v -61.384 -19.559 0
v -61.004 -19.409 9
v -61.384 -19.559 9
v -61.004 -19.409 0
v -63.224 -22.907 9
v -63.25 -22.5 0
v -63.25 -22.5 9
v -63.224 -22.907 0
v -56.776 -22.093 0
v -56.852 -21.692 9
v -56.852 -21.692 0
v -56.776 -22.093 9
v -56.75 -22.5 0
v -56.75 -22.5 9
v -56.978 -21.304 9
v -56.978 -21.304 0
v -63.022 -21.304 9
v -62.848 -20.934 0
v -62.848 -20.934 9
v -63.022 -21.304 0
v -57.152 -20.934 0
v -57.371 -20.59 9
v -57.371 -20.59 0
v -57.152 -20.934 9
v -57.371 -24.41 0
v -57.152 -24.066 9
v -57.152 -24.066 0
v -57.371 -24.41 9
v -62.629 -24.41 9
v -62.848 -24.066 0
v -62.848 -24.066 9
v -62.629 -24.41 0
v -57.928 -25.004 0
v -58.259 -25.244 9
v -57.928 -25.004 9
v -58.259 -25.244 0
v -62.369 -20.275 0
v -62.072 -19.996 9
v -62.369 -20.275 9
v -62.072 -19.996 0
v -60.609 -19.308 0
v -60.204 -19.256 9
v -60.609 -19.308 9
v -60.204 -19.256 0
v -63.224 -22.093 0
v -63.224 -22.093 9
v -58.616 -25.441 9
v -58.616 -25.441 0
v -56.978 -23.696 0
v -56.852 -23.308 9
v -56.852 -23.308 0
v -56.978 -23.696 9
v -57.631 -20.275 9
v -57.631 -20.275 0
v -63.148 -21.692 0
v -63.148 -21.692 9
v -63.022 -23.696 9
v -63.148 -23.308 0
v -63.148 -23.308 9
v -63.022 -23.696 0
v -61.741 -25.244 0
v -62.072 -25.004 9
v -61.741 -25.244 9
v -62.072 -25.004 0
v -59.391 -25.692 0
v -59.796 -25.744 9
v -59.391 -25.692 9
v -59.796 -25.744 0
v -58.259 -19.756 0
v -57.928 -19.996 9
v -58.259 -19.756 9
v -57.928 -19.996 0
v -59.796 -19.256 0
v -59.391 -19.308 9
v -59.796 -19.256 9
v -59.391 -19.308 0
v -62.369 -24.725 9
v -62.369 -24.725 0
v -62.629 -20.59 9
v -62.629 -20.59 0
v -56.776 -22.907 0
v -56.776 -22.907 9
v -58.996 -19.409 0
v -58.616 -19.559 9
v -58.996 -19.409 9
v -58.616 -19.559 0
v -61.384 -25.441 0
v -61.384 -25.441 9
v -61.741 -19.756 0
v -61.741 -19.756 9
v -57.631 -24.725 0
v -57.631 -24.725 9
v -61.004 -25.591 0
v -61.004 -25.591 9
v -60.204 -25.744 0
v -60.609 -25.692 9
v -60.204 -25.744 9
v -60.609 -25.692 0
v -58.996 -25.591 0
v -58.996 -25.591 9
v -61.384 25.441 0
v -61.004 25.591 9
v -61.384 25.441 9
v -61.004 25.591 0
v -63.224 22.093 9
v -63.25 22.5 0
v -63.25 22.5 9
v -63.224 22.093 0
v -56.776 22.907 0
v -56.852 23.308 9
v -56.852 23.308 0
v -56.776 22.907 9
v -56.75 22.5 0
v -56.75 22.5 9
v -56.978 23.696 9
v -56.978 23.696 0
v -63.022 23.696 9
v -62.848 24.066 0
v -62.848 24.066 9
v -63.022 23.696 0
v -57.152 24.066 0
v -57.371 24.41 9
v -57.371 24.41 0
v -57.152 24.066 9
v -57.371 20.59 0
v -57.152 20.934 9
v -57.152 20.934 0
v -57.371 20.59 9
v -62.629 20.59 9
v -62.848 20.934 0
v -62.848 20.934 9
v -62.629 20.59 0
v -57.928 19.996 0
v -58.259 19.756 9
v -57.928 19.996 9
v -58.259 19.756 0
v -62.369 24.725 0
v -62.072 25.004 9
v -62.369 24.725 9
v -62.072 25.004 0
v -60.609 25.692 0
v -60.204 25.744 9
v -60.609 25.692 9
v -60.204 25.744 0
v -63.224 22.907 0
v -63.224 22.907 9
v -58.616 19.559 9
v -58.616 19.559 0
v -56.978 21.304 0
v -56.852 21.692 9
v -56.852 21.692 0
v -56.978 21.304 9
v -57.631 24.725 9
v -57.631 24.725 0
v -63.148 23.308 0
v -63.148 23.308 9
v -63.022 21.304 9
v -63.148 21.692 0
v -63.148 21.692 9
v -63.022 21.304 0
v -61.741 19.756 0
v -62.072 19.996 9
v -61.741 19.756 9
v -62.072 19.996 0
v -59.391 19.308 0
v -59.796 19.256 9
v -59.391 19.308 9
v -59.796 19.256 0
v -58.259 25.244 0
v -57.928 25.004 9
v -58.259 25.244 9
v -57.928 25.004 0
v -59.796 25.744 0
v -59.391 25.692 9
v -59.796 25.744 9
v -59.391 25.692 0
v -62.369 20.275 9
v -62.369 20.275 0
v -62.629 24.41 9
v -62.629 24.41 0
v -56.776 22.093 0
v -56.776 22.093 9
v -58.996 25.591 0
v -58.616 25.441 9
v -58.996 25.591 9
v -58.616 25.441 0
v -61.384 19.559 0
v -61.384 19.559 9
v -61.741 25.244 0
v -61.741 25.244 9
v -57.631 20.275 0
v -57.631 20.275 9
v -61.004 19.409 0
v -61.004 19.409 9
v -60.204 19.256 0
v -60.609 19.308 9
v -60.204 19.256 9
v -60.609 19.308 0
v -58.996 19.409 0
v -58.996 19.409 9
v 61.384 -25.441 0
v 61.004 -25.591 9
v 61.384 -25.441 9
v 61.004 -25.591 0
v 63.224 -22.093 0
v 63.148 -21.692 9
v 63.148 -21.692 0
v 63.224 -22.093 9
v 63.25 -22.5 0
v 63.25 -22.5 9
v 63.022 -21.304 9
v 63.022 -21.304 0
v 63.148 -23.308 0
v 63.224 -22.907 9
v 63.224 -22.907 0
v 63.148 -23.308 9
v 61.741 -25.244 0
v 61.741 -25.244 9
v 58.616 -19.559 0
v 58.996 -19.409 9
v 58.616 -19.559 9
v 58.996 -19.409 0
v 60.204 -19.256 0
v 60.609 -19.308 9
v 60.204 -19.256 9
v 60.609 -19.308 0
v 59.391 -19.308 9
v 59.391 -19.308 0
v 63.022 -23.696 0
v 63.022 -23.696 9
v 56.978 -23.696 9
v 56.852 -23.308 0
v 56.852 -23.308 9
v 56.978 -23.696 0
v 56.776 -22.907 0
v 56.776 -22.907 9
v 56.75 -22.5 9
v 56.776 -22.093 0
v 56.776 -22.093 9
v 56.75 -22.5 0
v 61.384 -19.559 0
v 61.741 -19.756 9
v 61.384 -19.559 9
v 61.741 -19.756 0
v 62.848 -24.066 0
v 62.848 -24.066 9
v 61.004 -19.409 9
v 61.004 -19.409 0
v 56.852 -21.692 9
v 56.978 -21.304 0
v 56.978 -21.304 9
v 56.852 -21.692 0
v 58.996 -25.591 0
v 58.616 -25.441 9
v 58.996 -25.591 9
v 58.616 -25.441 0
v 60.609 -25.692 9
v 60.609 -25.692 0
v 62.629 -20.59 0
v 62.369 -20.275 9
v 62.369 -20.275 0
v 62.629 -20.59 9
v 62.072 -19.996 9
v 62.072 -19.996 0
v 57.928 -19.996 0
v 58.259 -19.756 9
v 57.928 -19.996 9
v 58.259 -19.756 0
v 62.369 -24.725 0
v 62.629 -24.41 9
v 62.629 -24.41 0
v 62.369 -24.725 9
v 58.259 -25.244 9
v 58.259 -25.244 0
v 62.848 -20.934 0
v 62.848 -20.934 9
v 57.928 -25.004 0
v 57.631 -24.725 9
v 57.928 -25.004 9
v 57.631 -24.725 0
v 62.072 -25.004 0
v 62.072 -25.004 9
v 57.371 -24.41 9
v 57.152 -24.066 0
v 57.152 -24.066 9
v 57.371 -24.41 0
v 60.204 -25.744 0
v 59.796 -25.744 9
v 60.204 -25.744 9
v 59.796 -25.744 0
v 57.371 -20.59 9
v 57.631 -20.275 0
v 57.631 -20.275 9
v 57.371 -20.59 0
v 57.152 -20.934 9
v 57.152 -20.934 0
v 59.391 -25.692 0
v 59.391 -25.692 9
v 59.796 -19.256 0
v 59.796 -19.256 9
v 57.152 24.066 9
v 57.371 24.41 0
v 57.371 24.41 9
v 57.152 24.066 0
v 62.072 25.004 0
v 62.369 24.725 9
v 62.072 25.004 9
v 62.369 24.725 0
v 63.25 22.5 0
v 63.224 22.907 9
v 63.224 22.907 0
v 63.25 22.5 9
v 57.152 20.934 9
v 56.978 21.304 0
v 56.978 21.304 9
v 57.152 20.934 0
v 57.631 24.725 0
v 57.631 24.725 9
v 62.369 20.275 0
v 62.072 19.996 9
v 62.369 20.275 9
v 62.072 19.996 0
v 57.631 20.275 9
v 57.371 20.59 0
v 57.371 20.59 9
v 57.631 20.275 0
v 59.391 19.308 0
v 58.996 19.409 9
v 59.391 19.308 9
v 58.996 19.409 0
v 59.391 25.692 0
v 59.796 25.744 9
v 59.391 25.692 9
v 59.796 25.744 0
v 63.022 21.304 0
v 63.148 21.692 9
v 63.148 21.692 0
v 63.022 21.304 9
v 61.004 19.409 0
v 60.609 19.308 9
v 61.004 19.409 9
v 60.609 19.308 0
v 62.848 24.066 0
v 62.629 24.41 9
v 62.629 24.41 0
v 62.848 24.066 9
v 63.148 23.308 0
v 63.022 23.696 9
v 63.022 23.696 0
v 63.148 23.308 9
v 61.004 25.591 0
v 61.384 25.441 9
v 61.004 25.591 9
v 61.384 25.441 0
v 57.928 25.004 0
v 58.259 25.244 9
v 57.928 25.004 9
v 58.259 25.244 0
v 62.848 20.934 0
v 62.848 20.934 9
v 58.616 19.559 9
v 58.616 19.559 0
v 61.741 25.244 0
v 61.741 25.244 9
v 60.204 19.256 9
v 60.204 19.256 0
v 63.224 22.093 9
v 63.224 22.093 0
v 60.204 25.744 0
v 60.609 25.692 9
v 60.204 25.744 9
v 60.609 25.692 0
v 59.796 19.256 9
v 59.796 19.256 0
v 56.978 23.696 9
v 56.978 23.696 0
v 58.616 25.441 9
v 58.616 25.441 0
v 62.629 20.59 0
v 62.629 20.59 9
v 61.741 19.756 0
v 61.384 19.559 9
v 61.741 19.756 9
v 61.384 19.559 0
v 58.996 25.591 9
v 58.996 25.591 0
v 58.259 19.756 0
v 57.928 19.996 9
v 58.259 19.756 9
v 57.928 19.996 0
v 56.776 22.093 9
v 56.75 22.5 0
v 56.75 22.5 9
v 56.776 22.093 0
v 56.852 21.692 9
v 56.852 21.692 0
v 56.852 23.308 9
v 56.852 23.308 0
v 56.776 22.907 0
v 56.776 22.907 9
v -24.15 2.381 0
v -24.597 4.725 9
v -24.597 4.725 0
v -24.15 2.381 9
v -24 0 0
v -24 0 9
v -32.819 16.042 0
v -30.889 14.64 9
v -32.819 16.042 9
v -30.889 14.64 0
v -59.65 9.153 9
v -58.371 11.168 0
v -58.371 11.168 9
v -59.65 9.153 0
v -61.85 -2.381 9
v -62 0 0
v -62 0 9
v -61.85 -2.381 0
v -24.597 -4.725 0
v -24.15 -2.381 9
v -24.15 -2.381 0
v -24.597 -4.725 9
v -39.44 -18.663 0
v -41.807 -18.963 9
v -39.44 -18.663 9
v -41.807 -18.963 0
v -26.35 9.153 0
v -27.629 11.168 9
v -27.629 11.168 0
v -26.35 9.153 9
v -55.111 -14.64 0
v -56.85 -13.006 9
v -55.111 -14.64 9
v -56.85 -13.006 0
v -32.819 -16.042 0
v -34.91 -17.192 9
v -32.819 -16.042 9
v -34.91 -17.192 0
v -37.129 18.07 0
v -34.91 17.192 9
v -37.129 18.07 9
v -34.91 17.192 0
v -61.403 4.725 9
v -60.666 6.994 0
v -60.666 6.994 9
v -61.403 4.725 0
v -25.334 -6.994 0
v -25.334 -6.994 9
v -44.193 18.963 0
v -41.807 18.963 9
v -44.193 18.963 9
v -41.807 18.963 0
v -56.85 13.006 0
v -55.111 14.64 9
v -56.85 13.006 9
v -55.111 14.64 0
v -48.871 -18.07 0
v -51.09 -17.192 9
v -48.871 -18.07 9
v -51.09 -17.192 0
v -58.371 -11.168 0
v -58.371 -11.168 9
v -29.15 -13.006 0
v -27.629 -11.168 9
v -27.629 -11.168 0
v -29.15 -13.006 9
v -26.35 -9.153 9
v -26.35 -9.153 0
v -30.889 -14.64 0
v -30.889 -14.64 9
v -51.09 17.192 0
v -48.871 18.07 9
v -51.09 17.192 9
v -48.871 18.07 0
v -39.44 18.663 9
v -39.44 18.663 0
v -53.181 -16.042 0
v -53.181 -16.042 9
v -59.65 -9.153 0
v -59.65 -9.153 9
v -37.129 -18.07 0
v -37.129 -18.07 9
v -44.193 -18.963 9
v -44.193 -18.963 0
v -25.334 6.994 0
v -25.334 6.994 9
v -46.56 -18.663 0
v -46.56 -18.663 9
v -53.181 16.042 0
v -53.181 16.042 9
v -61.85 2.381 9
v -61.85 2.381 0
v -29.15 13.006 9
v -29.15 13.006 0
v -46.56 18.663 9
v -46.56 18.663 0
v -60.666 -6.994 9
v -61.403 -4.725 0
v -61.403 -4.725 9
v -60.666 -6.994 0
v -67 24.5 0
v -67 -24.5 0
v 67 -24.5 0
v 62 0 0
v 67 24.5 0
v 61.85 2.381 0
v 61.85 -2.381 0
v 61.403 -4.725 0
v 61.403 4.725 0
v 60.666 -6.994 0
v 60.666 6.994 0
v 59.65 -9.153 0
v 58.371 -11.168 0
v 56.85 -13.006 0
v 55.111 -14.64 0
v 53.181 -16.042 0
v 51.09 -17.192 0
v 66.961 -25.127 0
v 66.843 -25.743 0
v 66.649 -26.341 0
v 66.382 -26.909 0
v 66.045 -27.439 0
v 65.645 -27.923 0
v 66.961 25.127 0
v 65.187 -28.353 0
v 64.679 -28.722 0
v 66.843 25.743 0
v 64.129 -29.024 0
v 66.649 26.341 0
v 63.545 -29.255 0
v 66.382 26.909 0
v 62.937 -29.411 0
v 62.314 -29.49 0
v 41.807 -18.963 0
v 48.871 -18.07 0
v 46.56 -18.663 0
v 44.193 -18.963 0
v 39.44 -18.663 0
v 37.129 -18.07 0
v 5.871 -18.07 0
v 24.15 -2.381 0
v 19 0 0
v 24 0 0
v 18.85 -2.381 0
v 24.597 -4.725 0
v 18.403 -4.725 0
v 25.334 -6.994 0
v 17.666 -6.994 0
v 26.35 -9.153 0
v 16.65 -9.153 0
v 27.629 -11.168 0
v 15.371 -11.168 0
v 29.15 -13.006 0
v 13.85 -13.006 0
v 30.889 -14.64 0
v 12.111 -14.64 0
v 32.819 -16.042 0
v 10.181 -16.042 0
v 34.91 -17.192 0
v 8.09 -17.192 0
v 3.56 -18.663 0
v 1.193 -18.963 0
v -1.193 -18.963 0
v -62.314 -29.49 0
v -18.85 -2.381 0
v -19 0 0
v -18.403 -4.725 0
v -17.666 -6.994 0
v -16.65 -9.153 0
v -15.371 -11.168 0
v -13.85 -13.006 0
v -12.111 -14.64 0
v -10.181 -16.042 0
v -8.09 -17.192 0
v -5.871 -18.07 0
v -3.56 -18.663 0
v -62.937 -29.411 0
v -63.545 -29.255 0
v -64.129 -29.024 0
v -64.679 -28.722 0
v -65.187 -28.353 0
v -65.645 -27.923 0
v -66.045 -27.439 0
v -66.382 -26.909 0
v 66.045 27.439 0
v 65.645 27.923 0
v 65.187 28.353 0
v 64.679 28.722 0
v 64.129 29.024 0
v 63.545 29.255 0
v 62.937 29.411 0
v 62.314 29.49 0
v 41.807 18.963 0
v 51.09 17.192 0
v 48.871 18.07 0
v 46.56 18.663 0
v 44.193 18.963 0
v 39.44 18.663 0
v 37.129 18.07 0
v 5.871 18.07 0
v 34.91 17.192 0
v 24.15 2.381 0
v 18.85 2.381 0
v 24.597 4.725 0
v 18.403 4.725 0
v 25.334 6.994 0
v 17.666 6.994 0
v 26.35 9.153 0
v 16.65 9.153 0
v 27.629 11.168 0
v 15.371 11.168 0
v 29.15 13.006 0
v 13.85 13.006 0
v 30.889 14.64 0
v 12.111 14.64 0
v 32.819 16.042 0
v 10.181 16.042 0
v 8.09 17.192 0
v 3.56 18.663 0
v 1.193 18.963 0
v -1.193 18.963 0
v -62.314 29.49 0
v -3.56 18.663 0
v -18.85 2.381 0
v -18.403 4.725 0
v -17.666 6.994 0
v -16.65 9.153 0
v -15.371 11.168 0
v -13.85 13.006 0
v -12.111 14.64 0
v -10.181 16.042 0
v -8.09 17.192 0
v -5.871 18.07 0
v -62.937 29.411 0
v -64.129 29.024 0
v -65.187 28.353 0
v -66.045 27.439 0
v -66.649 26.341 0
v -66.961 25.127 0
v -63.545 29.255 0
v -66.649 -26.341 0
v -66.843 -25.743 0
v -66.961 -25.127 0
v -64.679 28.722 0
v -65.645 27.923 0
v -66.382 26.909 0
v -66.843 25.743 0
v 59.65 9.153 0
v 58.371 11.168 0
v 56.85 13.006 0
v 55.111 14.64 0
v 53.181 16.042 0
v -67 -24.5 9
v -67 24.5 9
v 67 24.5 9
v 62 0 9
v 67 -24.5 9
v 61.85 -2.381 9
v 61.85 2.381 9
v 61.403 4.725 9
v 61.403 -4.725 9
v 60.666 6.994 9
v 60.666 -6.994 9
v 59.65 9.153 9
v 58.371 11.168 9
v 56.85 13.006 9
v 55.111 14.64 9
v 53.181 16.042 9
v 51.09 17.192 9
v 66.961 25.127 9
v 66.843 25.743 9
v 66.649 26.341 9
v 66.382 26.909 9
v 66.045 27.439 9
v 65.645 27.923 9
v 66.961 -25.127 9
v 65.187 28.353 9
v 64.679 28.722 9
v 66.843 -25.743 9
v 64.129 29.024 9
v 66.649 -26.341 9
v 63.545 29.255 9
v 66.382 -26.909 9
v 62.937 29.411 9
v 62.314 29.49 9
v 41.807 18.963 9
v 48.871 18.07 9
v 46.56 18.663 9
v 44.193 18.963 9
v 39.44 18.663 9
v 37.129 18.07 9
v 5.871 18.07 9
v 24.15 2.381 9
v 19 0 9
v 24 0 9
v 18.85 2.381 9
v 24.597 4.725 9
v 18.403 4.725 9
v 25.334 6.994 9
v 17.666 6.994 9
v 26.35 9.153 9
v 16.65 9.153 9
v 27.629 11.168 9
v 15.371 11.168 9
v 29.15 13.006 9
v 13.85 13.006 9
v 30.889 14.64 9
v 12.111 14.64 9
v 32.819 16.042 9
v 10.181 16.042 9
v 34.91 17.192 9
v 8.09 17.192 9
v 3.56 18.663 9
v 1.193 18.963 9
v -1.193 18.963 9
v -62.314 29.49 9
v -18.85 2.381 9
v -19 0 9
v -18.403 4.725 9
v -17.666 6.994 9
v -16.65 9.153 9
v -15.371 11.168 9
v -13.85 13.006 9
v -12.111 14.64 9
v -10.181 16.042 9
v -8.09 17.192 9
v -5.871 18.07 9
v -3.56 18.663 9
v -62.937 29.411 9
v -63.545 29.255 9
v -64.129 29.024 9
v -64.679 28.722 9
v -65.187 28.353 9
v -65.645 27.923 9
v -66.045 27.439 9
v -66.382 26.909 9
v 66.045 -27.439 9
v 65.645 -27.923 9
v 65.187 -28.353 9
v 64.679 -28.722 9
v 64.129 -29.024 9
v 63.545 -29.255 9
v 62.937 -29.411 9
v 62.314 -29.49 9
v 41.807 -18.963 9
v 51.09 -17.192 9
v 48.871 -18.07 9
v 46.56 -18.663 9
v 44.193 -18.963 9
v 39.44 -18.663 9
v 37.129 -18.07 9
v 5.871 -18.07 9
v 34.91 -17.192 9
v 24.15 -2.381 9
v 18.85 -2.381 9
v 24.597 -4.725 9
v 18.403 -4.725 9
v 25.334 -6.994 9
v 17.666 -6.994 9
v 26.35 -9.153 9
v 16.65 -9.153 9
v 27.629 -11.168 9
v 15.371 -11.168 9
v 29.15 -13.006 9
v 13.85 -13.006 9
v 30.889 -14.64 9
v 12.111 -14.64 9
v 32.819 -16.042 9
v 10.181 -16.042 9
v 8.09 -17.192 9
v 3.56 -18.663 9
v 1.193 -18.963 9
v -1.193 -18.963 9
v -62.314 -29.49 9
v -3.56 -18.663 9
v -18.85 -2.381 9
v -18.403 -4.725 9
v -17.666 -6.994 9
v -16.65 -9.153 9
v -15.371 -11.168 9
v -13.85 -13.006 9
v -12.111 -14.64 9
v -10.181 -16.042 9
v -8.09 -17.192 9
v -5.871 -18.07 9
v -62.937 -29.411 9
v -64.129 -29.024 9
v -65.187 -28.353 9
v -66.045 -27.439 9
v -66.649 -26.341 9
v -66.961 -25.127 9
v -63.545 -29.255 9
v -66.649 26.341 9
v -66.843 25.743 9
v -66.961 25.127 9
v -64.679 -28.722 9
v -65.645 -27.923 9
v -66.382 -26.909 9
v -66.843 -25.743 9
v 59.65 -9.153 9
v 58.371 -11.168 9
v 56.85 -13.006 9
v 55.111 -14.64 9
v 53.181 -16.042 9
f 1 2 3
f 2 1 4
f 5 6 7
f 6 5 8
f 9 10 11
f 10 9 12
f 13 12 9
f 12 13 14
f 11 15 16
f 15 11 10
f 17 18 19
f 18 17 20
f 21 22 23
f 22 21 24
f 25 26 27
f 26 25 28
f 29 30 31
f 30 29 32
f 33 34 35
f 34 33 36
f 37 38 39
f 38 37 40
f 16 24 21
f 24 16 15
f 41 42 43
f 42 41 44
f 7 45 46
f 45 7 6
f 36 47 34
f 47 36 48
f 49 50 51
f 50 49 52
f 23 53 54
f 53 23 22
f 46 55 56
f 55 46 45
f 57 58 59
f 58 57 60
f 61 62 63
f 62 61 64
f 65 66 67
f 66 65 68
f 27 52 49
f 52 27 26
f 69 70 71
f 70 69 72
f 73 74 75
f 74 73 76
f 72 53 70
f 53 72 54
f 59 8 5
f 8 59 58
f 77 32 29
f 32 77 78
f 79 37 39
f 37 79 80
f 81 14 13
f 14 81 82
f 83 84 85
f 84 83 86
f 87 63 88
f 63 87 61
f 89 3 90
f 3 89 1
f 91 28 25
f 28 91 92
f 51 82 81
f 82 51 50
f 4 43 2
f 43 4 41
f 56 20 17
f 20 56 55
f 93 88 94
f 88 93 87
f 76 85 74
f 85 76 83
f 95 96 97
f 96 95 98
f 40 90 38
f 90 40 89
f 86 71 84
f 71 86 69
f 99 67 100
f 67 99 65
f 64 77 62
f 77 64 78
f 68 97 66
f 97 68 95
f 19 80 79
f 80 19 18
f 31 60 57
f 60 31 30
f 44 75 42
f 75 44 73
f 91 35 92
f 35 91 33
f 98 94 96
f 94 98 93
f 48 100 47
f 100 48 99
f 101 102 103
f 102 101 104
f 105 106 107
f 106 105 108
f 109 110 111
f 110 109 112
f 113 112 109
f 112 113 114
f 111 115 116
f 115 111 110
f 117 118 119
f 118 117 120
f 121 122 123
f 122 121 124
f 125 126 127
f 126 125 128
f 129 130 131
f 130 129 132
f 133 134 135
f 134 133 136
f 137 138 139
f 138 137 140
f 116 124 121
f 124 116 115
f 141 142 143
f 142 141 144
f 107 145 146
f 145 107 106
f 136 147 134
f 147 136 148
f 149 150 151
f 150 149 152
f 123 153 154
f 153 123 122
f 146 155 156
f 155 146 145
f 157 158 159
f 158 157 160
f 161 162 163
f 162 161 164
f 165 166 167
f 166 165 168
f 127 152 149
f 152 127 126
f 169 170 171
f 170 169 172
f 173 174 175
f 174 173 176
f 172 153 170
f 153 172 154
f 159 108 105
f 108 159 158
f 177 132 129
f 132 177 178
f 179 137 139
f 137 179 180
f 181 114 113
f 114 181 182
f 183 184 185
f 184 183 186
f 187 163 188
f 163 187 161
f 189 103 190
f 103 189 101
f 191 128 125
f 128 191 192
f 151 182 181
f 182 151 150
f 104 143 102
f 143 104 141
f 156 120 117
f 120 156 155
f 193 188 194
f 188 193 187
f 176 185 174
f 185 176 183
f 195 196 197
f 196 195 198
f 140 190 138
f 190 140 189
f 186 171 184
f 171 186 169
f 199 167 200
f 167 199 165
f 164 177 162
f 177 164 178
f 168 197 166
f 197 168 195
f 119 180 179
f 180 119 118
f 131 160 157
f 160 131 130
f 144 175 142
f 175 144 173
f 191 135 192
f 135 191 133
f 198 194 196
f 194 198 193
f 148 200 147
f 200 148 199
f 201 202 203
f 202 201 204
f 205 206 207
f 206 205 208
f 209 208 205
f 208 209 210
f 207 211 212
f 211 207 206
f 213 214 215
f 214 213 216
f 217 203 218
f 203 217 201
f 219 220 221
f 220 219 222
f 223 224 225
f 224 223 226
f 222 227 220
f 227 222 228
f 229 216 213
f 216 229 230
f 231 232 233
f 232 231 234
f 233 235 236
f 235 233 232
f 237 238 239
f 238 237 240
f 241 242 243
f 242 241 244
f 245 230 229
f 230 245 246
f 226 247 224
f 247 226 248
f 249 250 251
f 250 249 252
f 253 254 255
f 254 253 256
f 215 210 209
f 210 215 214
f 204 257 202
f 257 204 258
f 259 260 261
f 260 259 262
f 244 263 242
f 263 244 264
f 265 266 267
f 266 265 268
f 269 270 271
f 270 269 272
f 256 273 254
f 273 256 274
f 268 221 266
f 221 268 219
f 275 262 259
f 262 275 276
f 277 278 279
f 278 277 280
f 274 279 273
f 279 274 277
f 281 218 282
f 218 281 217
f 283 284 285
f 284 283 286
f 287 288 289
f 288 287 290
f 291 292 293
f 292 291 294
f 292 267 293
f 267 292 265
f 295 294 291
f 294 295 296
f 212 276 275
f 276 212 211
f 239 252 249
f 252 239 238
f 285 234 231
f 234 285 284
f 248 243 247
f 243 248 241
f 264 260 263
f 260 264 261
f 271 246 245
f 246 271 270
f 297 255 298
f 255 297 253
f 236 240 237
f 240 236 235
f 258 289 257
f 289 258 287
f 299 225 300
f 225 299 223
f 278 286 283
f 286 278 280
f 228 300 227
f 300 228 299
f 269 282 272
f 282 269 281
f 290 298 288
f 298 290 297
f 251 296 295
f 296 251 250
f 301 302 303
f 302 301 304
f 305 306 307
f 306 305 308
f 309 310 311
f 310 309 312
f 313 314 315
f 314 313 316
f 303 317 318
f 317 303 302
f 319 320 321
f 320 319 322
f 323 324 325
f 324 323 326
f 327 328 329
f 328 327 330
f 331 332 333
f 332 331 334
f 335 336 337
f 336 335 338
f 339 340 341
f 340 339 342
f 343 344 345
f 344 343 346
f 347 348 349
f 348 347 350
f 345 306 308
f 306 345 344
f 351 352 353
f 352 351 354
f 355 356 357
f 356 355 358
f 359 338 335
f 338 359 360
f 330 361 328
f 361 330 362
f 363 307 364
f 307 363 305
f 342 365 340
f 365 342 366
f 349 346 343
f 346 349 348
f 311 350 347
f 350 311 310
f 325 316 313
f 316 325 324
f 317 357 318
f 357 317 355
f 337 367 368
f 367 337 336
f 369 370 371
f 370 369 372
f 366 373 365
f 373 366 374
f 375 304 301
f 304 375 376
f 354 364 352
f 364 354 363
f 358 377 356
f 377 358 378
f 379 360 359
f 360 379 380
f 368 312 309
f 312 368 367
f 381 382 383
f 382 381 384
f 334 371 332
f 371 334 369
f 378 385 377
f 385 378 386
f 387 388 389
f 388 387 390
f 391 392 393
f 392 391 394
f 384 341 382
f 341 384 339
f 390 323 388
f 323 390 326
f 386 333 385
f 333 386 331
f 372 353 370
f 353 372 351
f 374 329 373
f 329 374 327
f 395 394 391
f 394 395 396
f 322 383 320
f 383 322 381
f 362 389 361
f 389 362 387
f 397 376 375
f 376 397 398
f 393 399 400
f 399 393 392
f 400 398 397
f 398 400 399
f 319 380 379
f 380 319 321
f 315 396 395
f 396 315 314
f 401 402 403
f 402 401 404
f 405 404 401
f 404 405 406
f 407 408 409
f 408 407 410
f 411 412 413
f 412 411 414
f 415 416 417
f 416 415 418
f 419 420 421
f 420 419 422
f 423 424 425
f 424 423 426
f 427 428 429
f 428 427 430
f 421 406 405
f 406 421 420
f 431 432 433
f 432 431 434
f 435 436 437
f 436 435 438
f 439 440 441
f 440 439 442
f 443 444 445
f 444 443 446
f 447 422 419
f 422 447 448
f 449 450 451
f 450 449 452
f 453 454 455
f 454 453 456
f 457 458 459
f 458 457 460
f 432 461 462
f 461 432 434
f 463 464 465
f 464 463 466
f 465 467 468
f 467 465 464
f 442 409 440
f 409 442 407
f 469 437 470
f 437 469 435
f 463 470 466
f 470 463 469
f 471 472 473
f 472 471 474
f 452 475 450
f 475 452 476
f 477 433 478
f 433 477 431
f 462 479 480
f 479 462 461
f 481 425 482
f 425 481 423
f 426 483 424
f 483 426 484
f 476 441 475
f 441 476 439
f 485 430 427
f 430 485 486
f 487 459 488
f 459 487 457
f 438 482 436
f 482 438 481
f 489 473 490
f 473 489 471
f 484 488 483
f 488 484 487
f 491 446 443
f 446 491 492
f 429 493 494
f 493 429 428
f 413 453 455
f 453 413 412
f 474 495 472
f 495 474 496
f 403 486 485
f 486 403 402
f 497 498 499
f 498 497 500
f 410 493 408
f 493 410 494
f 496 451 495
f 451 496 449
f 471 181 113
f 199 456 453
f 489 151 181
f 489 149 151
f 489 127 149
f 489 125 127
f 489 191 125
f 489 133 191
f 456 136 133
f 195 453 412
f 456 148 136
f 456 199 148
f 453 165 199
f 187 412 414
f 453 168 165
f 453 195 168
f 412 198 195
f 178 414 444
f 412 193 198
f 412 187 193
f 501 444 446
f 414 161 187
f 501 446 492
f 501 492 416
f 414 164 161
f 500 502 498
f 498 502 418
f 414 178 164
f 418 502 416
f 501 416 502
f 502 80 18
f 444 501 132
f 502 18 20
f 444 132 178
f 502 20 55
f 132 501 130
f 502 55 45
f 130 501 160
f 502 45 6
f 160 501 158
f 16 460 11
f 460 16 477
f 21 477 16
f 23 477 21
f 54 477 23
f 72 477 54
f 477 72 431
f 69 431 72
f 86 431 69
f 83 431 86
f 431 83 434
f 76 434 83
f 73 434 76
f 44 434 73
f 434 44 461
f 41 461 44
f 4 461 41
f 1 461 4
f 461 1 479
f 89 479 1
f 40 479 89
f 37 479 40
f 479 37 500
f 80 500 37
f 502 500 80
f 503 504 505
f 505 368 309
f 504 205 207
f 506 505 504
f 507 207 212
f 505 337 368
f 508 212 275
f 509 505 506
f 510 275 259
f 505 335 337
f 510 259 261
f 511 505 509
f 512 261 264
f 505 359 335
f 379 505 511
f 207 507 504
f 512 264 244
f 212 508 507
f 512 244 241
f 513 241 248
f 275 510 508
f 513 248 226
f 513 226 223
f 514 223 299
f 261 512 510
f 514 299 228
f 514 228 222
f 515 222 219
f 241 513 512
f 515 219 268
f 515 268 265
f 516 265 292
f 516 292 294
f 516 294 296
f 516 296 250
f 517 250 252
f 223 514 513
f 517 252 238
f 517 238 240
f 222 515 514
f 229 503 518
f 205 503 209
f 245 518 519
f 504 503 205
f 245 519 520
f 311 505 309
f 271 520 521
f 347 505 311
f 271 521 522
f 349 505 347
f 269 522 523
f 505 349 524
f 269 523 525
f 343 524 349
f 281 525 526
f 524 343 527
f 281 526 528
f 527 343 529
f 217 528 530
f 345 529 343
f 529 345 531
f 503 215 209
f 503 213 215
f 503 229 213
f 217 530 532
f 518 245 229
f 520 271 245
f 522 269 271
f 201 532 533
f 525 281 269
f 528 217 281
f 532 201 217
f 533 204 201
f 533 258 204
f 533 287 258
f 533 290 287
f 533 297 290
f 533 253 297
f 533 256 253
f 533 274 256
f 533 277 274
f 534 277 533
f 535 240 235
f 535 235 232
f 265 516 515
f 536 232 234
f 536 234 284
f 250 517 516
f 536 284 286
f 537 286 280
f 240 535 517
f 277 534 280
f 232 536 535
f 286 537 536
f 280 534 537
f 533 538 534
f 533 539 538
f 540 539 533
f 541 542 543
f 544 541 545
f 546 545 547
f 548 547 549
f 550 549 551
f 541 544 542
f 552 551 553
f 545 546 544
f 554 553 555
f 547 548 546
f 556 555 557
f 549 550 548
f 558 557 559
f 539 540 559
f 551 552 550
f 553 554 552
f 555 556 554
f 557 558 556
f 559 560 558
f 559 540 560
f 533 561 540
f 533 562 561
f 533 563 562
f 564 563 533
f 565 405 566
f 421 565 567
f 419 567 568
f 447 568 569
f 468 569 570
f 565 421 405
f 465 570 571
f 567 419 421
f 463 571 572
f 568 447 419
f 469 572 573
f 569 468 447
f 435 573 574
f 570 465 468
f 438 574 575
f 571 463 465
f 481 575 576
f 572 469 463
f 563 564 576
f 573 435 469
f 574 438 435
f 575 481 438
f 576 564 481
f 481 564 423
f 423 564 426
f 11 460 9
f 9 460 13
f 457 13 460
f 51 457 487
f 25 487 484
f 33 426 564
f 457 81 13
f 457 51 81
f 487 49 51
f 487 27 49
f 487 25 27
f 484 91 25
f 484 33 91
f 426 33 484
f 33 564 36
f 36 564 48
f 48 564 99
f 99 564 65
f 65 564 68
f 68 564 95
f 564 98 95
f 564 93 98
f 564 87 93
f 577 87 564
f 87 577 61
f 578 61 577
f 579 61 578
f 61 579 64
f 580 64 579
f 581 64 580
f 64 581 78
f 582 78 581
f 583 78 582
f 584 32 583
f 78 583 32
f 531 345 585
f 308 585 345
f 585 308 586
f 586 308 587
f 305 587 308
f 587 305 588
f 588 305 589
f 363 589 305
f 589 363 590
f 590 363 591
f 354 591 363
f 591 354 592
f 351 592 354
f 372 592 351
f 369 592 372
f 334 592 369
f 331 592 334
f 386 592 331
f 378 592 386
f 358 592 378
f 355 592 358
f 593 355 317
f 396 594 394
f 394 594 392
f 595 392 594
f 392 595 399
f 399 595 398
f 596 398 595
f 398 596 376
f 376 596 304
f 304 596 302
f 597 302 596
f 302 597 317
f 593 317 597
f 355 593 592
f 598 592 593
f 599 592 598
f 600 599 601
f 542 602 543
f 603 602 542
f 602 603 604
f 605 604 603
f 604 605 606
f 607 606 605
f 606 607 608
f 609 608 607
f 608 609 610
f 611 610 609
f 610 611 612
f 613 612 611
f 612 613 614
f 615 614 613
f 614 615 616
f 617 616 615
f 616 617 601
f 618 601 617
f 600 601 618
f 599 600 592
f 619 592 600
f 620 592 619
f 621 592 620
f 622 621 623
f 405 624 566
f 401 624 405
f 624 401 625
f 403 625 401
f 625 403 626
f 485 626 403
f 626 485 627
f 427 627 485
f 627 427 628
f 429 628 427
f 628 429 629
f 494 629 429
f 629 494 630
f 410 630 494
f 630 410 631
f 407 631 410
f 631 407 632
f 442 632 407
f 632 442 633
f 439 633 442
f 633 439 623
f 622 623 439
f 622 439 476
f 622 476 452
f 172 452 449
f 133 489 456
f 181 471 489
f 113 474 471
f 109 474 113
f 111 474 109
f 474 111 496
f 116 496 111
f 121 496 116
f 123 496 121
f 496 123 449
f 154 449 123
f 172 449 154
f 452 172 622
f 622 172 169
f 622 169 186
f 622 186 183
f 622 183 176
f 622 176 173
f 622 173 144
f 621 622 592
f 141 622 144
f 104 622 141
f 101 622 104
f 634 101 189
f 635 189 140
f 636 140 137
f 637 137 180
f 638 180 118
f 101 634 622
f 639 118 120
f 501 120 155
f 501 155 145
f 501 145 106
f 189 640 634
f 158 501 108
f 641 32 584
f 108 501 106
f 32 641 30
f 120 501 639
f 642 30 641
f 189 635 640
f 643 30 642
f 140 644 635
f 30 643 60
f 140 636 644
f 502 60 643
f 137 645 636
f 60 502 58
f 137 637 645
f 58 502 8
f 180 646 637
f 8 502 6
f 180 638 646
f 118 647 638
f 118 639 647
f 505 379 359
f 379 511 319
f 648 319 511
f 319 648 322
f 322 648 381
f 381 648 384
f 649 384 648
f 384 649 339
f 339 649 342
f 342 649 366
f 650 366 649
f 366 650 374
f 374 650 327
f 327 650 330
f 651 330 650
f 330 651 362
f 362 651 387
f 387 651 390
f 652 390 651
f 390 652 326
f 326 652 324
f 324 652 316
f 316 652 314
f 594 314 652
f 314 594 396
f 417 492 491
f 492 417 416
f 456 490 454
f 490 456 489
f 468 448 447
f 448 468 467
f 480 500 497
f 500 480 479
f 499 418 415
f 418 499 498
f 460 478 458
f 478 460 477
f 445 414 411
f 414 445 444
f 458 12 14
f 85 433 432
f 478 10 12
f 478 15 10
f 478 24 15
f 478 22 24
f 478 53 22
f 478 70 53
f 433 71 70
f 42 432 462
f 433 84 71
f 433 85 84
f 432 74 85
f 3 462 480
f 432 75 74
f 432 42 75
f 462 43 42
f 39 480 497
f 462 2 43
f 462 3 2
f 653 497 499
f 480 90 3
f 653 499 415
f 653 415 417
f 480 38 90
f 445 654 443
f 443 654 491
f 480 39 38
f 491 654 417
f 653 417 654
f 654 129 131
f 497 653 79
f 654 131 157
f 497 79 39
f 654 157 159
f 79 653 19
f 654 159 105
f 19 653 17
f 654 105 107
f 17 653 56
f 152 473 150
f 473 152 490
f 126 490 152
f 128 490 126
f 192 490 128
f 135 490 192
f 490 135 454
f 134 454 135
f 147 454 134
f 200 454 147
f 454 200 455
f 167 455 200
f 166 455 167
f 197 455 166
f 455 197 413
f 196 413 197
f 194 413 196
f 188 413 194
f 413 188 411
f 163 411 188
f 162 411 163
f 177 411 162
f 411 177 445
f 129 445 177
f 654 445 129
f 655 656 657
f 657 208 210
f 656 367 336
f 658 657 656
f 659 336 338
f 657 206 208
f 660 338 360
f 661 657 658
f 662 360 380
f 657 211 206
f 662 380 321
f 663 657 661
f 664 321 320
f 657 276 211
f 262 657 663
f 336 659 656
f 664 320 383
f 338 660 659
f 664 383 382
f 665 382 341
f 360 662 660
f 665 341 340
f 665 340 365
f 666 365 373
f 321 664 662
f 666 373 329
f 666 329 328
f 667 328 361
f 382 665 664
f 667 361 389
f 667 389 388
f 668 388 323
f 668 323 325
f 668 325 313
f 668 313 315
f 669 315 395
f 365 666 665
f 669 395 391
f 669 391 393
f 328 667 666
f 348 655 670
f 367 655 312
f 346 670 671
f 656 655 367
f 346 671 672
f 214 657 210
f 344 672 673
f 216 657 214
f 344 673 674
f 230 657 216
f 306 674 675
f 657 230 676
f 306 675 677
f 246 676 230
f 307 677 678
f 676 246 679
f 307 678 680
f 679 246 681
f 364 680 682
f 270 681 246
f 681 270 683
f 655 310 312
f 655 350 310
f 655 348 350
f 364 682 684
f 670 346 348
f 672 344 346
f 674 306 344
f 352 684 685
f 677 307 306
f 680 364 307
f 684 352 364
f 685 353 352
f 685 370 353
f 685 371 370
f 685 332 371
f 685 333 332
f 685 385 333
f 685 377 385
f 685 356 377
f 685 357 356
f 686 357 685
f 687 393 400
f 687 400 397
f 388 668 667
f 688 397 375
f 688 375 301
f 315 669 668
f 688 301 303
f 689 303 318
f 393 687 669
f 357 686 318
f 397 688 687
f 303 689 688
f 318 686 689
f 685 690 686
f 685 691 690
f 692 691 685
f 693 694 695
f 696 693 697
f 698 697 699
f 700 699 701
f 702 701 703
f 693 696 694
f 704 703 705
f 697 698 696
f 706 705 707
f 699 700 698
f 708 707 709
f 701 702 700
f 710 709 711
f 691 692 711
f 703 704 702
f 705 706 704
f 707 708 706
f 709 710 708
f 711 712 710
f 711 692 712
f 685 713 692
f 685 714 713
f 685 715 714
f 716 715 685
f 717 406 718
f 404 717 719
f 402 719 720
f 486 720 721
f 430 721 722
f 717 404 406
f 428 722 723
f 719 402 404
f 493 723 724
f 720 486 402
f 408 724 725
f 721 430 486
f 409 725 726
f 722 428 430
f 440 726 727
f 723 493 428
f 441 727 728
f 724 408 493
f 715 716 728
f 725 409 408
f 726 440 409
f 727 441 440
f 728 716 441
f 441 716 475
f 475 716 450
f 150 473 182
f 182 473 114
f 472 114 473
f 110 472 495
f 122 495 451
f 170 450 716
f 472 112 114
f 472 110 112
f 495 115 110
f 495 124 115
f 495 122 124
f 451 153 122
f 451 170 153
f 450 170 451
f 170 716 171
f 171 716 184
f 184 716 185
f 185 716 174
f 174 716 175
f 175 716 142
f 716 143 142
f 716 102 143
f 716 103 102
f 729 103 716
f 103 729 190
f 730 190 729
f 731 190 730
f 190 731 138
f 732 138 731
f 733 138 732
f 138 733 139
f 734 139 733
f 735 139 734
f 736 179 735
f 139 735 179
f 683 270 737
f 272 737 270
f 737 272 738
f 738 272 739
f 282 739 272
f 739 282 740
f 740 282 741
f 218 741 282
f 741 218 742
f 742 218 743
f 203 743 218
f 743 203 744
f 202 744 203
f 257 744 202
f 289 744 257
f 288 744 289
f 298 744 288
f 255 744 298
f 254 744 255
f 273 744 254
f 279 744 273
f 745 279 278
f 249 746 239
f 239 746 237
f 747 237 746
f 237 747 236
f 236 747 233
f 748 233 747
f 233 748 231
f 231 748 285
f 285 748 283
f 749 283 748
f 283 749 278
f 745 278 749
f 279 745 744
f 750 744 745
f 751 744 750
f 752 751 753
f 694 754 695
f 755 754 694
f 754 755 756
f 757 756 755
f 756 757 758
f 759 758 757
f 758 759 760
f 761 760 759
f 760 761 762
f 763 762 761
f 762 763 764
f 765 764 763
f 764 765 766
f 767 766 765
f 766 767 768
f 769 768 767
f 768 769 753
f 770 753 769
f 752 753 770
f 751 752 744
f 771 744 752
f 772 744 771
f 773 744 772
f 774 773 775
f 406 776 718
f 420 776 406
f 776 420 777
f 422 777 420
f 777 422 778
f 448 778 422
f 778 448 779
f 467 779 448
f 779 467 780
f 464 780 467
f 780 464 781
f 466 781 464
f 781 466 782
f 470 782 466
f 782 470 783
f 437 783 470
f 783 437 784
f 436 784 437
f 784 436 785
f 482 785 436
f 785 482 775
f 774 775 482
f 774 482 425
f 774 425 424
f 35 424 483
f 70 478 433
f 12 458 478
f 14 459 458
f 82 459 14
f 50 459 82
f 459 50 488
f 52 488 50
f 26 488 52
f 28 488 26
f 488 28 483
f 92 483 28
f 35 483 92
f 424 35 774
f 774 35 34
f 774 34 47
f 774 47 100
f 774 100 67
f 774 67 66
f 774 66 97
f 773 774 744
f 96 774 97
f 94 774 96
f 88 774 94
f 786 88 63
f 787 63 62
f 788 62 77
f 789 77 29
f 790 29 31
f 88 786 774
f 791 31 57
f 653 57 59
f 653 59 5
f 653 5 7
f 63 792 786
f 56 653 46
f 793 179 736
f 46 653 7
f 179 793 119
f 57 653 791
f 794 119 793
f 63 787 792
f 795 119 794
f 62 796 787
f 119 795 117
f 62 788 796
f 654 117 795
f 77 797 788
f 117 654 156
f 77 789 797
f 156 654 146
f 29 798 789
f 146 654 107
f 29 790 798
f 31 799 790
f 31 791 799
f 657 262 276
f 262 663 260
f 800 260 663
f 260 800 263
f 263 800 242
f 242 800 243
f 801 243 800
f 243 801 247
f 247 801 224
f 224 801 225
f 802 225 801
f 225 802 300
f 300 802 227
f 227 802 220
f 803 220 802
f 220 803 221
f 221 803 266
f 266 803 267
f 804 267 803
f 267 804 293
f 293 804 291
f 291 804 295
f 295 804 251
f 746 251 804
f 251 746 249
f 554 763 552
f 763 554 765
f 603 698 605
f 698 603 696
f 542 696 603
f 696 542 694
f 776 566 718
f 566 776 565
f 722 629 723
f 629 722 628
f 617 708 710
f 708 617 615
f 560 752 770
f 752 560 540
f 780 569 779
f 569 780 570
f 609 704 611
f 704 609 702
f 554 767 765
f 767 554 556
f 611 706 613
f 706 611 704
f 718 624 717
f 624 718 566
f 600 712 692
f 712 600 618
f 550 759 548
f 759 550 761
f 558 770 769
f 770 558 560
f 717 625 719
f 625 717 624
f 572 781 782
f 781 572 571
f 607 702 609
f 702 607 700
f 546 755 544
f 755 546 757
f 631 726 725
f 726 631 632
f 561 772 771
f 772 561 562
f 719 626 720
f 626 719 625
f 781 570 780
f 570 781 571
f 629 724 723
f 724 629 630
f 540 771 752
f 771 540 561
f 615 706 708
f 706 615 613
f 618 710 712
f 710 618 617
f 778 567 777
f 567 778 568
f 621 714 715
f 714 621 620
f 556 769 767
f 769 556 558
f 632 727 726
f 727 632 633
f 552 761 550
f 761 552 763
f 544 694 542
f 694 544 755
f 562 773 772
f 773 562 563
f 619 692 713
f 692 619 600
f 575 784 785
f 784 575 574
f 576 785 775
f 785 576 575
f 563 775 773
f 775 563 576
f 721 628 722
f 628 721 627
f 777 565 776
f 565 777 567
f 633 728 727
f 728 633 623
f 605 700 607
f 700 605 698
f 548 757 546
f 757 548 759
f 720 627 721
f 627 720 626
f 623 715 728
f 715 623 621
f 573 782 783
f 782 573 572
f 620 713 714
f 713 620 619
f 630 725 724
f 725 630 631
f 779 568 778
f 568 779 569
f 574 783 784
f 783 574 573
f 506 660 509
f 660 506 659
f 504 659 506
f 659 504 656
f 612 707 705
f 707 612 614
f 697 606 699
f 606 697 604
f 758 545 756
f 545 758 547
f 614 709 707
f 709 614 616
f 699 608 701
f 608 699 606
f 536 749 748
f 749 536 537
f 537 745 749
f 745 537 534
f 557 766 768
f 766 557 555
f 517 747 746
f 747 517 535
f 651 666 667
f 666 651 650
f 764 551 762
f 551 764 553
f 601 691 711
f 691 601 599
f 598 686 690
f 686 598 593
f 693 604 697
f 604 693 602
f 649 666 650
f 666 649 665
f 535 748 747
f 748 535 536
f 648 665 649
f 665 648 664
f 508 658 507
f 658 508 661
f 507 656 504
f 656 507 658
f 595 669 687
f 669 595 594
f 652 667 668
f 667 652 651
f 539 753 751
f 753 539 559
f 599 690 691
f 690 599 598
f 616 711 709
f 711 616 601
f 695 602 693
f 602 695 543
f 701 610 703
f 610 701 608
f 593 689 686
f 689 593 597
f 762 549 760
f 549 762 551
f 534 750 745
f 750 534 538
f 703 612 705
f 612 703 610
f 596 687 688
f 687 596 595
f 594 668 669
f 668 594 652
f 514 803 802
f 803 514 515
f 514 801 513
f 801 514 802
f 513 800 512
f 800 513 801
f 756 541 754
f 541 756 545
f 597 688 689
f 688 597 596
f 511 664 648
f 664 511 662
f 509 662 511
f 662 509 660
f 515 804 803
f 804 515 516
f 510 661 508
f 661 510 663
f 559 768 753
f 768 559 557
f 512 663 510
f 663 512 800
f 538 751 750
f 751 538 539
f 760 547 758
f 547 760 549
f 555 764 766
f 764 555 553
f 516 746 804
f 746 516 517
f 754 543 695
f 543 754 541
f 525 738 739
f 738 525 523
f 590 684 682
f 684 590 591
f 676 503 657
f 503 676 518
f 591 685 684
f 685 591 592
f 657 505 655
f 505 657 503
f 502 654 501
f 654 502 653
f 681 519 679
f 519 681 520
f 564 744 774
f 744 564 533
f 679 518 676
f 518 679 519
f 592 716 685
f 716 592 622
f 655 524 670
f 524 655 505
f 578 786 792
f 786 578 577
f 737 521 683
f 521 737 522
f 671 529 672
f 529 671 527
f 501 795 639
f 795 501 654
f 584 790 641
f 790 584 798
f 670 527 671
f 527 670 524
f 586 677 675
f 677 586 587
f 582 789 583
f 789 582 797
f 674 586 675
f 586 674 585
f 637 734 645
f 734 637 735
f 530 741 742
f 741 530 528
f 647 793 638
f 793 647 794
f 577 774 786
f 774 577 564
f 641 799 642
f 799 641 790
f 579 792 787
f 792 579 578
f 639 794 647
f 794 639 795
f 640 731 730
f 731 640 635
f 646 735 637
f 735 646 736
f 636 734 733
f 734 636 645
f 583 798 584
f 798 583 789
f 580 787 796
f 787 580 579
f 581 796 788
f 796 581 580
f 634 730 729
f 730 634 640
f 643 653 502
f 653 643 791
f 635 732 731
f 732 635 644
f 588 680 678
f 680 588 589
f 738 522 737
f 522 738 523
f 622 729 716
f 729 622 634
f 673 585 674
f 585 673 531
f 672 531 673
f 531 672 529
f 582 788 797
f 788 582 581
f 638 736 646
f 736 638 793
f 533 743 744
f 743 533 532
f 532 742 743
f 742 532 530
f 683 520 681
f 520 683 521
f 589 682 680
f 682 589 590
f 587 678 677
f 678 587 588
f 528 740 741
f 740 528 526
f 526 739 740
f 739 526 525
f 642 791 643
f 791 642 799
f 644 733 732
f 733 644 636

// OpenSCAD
$fn = 50;


difference() {
	union() {
		hull() {
			translate(v = [-62.0000000000, 24.5000000000, 0]) {
				cylinder(h = 9, r = 5);
			}
			translate(v = [62.0000000000, 24.5000000000, 0]) {
				cylinder(h = 9, r = 5);
			}
			translate(v = [-62.0000000000, -24.5000000000, 0]) {
				cylinder(h = 9, r = 5);
			}
			translate(v = [62.0000000000, -24.5000000000, 0]) {
				cylinder(h = 9, r = 5);
			}
		}
	}
	union() {
		#translate(v = [-60.0000000000, -22.5000000000, -100.0000000000]) {
			cylinder(h = 200, r = 3.2500000000);
		}
		#translate(v = [-60.0000000000, 22.5000000000, -100.0000000000]) {
			cylinder(h = 200, r = 3.2500000000);
		}
		#translate(v = [60.0000000000, -22.5000000000, -100.0000000000]) {
			cylinder(h = 200, r = 3.2500000000);
		}
		#translate(v = [60.0000000000, 22.5000000000, -100.0000000000]) {
			cylinder(h = 200, r = 3.2500000000);
		}
		#translate(v = [-43.0000000000, 0, 0]) {
			cylinder(h = 9, r = 19.0000000000);
		}
		#cylinder(h = 9, r = 19.0000000000);
		#translate(v = [43.0000000000, 0, 0]) {
			cylinder(h = 9, r = 19.0000000000);
		}
	}
}
